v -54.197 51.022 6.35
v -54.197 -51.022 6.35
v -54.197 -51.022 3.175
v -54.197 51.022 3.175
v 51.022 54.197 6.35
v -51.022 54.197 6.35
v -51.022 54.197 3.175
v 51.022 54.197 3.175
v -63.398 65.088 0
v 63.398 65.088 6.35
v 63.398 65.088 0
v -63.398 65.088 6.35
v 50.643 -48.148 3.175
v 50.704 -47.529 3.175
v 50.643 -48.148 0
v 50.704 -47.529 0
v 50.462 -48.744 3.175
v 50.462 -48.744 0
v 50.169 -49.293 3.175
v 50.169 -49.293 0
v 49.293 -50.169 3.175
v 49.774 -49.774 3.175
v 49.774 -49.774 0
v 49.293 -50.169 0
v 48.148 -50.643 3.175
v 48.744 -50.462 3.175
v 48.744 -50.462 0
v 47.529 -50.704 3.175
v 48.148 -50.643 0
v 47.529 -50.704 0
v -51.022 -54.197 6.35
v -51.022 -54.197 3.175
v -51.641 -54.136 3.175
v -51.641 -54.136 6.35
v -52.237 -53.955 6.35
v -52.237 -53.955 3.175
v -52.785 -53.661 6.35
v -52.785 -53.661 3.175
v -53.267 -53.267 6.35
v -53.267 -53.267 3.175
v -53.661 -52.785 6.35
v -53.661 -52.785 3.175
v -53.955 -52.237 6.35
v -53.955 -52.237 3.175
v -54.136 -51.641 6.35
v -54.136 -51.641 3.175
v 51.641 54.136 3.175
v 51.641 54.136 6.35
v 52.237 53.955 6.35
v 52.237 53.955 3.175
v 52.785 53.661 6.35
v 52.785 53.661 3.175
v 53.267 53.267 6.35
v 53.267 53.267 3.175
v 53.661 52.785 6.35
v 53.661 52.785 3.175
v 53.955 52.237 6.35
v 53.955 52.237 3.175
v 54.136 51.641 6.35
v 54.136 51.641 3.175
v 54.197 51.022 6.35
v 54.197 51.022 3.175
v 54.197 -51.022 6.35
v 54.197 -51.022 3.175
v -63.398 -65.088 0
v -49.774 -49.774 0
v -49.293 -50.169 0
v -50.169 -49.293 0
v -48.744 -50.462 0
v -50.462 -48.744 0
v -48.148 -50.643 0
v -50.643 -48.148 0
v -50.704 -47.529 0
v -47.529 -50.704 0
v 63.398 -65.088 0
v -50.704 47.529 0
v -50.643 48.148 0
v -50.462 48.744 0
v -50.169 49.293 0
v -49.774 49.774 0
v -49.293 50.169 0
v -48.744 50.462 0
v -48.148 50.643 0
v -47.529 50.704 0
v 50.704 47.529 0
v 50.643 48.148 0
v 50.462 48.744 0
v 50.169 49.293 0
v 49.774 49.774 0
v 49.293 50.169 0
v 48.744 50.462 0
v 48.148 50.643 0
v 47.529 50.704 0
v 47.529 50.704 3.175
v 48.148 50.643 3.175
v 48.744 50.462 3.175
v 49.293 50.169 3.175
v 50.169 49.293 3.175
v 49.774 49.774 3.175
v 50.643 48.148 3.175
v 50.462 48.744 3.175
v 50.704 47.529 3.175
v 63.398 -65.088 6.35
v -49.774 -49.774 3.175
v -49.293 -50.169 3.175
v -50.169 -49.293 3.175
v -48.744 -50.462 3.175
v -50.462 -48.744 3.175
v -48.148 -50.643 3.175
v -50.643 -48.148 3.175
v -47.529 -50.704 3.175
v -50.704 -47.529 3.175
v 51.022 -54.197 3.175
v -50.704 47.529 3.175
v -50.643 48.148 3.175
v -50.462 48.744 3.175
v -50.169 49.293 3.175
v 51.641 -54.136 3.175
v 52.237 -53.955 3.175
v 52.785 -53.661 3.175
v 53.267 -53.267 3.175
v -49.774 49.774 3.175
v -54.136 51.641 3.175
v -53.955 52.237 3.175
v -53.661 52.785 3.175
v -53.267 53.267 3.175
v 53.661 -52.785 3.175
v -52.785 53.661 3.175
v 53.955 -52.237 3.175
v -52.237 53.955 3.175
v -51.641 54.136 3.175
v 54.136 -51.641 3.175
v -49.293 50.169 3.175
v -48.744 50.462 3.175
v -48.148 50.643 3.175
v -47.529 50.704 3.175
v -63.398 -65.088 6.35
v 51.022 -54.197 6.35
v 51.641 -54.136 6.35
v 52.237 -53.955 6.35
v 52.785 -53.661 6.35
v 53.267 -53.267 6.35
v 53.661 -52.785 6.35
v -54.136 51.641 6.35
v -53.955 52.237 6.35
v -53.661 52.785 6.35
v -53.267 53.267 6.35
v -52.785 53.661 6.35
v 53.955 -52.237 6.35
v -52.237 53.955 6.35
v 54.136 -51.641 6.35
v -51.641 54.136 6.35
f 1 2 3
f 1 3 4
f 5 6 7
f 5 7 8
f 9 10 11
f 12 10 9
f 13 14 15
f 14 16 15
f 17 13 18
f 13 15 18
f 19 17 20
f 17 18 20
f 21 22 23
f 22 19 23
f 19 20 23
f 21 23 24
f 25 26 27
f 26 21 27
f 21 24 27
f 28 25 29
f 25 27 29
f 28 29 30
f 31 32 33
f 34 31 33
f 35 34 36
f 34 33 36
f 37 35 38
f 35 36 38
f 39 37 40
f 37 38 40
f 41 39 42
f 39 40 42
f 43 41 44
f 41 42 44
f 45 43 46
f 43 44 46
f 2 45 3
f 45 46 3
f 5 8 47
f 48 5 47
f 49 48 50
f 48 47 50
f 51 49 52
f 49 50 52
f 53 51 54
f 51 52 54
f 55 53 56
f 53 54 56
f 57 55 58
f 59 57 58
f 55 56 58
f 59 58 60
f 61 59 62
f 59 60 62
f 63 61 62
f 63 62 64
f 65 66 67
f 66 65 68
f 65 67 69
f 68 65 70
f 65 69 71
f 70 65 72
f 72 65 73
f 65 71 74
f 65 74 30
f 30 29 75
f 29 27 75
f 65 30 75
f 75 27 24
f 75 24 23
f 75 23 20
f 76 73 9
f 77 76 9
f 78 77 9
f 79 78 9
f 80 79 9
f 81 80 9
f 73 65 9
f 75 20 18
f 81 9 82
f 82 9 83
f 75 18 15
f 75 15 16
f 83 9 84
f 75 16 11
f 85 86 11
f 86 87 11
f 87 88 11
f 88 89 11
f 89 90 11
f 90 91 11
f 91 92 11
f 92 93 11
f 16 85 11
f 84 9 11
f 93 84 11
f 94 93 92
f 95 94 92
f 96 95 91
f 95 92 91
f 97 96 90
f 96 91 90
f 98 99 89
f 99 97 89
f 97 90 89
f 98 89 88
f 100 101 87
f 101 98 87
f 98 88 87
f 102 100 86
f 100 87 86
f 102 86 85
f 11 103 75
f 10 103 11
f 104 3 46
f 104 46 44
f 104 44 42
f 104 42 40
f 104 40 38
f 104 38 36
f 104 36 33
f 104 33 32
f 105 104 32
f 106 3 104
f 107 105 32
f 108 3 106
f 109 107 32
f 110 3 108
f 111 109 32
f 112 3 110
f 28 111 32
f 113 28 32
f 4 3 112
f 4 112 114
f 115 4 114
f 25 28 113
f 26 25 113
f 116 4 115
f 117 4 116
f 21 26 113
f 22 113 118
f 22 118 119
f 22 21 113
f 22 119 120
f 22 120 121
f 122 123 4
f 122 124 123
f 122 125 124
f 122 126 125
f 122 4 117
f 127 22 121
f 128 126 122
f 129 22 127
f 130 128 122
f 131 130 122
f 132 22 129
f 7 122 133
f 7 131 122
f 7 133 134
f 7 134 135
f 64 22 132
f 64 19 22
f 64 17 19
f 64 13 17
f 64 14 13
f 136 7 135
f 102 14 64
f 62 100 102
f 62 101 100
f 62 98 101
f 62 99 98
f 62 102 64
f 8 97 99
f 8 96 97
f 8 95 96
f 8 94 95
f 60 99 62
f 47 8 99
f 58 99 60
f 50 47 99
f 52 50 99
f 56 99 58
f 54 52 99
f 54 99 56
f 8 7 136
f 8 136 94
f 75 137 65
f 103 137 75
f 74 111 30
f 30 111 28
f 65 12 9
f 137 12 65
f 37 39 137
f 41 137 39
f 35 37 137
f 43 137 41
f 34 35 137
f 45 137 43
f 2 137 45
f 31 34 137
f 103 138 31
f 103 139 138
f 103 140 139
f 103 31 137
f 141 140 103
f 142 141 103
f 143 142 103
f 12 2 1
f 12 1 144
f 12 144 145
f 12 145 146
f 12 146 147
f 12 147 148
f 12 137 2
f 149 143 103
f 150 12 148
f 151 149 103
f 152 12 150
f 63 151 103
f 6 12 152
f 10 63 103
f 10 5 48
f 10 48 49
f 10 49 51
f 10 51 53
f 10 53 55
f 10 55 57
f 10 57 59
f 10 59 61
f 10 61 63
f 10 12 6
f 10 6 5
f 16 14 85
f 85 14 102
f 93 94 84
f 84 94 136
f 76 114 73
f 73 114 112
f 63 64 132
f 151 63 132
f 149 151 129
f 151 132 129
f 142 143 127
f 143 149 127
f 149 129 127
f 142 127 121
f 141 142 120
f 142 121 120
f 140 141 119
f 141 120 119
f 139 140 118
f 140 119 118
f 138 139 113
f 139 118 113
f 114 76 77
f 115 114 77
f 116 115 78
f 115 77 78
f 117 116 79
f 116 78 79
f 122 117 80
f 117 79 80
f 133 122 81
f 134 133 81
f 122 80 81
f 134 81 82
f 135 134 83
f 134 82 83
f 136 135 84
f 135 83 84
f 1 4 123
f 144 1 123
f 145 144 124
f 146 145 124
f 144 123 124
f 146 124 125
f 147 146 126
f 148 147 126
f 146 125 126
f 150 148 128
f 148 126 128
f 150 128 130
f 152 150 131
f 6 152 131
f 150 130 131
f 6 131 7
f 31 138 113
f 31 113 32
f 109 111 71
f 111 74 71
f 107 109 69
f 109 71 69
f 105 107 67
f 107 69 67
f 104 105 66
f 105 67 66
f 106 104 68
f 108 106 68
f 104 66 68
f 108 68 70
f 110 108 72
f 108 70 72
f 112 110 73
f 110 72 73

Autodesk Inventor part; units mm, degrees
ref_plane "YZ Plane" through (0, 0, 0) normal (1, 0, 0) x (0, 1, 0)
ref_plane "XZ Plane" through (0, 0, 0) normal (0, 1, 0) x (-1, 0, 0)
ref_plane "XY Plane" through (0, 0, 0) normal (0, 0, 1) x (1, 0, 0)
sketch "Sketch1" plane through (0, 0, 0) normal (0, 0, 1) x (1, 0, 0)
  line L0 (-53.975, 57.15) -> (53.975, 57.15) projected
  line L1 (57.15, 53.975) -> (57.15, -53.975) projected
  line L2 (53.975, -57.15) -> (-53.975, -57.15) projected
  line L3 (-57.15, -53.975) -> (-57.15, 53.975) projected
  line L4 (-63.3984, -63.5) -> (63.3984, -63.5) projected
  line L5 (63.3984, -63.5) -> (63.3984, 63.5) projected
  line L6 (63.3984, 63.5) -> (-63.3984, 63.5) projected
  line L7 (-63.3984, 63.5) -> (-63.3984, -63.5) projected
  arc A0 (57.15, 53.975) -> (53.975, 57.15) centre (53.975, 53.975) ccw projected
  arc A1 (53.975, -57.15) -> (57.15, -53.975) centre (53.975, -53.975) ccw projected
  arc A2 (-57.15, -53.975) -> (-53.975, -57.15) centre (-53.975, -53.975) ccw projected
  arc A3 (-53.975, 57.15) -> (-57.15, 53.975) centre (-53.975, 53.975) ccw projected
  point P0 (0, 0)
extrude "Extrusion1" add sketch "Sketch1" along normal blind 6.35 contours L0 A0 L1 A1 L2 A2 L3 A3 | L7 L6 L5 L4
sketch "Sketch2" plane through (0, 0, 6.35) normal (0, 0, 1) x (1, 0, 0)
  line L0 (50.704008, 50.704008) -> (-50.704008, 50.704008)
  line L1 (50.704008, -50.704008) -> (50.704008, 50.704008)
  line L2 (-50.704008, -50.704008) -> (50.704008, -50.704008)
  line L3 (-50.704008, 50.704008) -> (-50.704008, -50.704008)
  line L4 (-54.196508, 54.196508) -> (54.196508, 54.196508)
  line L5 (54.196508, 54.196508) -> (54.196508, -54.196508)
  line L6 (54.196508, -54.196508) -> (-54.196508, -54.196508)
  line L7 (-54.196508, -54.196508) -> (-54.196508, 54.196508)
  point P0 (0, 0)
  dimension "d2" = 3.4925
extrude "Extrusion2" cut sketch "Sketch2" against normal blind 3.175 contours L1 L2 L3 L0 | L4 L5 L6 L7
sketch "Sketch3" plane through (0, 0, 3.175) normal (0, 0, 1) x (1, 0, 0)
  line L0 (50.704008, 50.704008) -> (-50.704008, 50.704008)
  line L1 (-50.704008, 50.704008) -> (-50.704008, -50.704008)
  line L2 (44.233392, -50.704008) -> (44.233392, 50.704008)
  line L3 (-50.704008, -50.704008) -> (50.704008, -50.704008)
  point P0 (0, 0)
sketch "Sketch3 outline for Extrusion3" plane through (0, 0, 3.175) normal (0, 0, 1) x (1, 0, 0)
  line L0 (50.704008, -50.704008) -> (50.704008, 50.704008)
  line L1 (-50.704008, -50.704008) -> (50.704008, -50.704008)
  line L2 (-50.704008, 50.704008) -> (-50.704008, -50.704008)
  line L3 (50.704008, 50.704008) -> (-50.704008, 50.704008)
extrude "Extrusion3" cut sketch "Sketch3 outline for Extrusion3" against normal through all
sketch "Sketch4" plane through (0, 0, 6.35) normal (0, 0, 1) x (1, 0, 0)
  line L0 (-63.5, -65.0875) -> (63.5, -65.0875)
  line L1 (63.5, -65.0875) -> (63.5, 65.0875)
  line L2 (63.5, 65.0875) -> (-63.5, 65.0875)
  line L3 (-63.5, 65.0875) -> (-63.5, -65.0875)
  line L4 (-63.5, -65.0875) -> (63.5, 65.0875) construction
  line L5 (63.5, -65.0875) -> (-63.5, 65.0875) construction
  line L6 (-54.196508, -54.196508) -> (-54.196508, 54.196508)
  line L7 (-54.196508, 54.196508) -> (54.196508, 54.196508)
  line L8 (54.196508, 54.196508) -> (54.196508, -54.196508)
  line L9 (54.196508, -54.196508) -> (-54.196508, -54.196508)
  line L10 (-63.3984, -63.5) -> (63.3984, -63.5)
  line L11 (63.3984, -63.5) -> (63.3984, 63.5)
  line L12 (63.3984, 63.5) -> (-63.3984, 63.5)
  line L13 (-63.3984, 63.5) -> (-63.3984, -63.5)
  point P0 (0, 0)
  dimension "d7" = 130.175
  dimension "d8" = 127
extrude "Extrusion4" add sketch "Sketch4" against normal up to surface (6.35 mm away) contours L3 L2 L1 L0
sketch "Sketch5" plane through (0, 0, 6.35) normal (0, 0, 1) x (1, 0, 0)
  line L0 (63.5, 65.0875) -> (-63.5, 65.0875) projected
  line L1 (-63.3984, -65.0875) -> (63.3984, -65.0875)
  line L2 (63.3984, -65.0875) -> (63.3984, 65.0875)
  line L3 (63.3984, 65.0875) -> (-63.3984, 65.0875)
  line L4 (-63.3984, 65.0875) -> (-63.3984, -65.0875)
  line L5 (-63.3984, -65.0875) -> (63.3984, 65.0875) construction
  line L6 (63.3984, -65.0875) -> (-63.3984, 65.0875) construction
  point P0 (0, 0)
  dimension "d11" = 126.7968
extrude "Extrusion5" cut sketch "Sketch5" against normal through all keep common part
fillet "Fillet1" radius 3.175 8 edges at (-54.1965, 54.1965, 4.7625) (-54.1965, -54.1965, 4.7625) (-50.704, -50.704, 1.5875) (54.1965, 54.1965, 4.7625) (50.704, -50.704, 1.5875) (54.1965, -54.1965, 4.7625) (50.704, 50.704, 1.5875) (-50.704, 50.704, 1.5875)
equation "\"d0\" = plasticThickness"
equation "\"d2\" = 1.1 * mirrorThickness"
equation "\"d3\" = 0.5 * plasticThickness"
equation "\"d5\" = 0.5 * internalAcrylicThickness"
equation "\"d7\" = height + 2 * alignmentGrooveDepth"
equation "\"d8\" = width"
equation "\"d11\" = width - 2 * alignmentGrooveClearance"
equation "\"frameAcrylicThickness\" = 9.525"
equation "\"internalAcrylicThickness\" = 6.35"
equation "\"height\" = 127"
equation "\"width\" = 127"
equation "\"depth\" = 203.2"
equation "\"mirrorAngle\" = 2.5deg"
equation "\"detectorWidth\" = 52"
equation "\"detectorHeight\" = 52"
equation "\"mirrorThickness\" = 3.175"
equation "\"fresnelThickness\" = 0.254"
equation "\"focalLength\" = 152.4"
equation "\"ior\" = 1.49"
equation "\"centerThickness\" = 1.27"
equation "\"fresnelAngle\" = 90deg"
equation "\"fresnelEffectiveDiameter\" = 152.4"
equation "\"oRingWidth\" = 1.5875"
equation "\"sensorHolderDepth\" = 19.05"
equation "\"aerogelClearence\" = 3.175"
equation "\"backplanePCBWidth\" = 76.2"
equation "\"backplanePCBHeight\" = 76.2"
equation "\"backplaneHoleOffsett\" = 6.35"
equation "\"backplanePostionOffsett\" = 12.7"
equation "\"moduleSlotClearence\" = 0.79375"
equation "\"plasticThickness\" = 6.35"
equation "\"aerogelHolderDepth\" = 49.022"
equation "\"caseThickness\" = 6.35"
equation "\"alignmentGrooveDepth\" = 1.5875"
equation "\"alignmentGrooveClearance\" = 0.1016"
equation "\"frontPanelThickness\" = 1.5875"
equation "\"fresnelGrooveWidth\" = 1.778"
properties part number "mirrorBackFrame" material "ABS Plastic"
